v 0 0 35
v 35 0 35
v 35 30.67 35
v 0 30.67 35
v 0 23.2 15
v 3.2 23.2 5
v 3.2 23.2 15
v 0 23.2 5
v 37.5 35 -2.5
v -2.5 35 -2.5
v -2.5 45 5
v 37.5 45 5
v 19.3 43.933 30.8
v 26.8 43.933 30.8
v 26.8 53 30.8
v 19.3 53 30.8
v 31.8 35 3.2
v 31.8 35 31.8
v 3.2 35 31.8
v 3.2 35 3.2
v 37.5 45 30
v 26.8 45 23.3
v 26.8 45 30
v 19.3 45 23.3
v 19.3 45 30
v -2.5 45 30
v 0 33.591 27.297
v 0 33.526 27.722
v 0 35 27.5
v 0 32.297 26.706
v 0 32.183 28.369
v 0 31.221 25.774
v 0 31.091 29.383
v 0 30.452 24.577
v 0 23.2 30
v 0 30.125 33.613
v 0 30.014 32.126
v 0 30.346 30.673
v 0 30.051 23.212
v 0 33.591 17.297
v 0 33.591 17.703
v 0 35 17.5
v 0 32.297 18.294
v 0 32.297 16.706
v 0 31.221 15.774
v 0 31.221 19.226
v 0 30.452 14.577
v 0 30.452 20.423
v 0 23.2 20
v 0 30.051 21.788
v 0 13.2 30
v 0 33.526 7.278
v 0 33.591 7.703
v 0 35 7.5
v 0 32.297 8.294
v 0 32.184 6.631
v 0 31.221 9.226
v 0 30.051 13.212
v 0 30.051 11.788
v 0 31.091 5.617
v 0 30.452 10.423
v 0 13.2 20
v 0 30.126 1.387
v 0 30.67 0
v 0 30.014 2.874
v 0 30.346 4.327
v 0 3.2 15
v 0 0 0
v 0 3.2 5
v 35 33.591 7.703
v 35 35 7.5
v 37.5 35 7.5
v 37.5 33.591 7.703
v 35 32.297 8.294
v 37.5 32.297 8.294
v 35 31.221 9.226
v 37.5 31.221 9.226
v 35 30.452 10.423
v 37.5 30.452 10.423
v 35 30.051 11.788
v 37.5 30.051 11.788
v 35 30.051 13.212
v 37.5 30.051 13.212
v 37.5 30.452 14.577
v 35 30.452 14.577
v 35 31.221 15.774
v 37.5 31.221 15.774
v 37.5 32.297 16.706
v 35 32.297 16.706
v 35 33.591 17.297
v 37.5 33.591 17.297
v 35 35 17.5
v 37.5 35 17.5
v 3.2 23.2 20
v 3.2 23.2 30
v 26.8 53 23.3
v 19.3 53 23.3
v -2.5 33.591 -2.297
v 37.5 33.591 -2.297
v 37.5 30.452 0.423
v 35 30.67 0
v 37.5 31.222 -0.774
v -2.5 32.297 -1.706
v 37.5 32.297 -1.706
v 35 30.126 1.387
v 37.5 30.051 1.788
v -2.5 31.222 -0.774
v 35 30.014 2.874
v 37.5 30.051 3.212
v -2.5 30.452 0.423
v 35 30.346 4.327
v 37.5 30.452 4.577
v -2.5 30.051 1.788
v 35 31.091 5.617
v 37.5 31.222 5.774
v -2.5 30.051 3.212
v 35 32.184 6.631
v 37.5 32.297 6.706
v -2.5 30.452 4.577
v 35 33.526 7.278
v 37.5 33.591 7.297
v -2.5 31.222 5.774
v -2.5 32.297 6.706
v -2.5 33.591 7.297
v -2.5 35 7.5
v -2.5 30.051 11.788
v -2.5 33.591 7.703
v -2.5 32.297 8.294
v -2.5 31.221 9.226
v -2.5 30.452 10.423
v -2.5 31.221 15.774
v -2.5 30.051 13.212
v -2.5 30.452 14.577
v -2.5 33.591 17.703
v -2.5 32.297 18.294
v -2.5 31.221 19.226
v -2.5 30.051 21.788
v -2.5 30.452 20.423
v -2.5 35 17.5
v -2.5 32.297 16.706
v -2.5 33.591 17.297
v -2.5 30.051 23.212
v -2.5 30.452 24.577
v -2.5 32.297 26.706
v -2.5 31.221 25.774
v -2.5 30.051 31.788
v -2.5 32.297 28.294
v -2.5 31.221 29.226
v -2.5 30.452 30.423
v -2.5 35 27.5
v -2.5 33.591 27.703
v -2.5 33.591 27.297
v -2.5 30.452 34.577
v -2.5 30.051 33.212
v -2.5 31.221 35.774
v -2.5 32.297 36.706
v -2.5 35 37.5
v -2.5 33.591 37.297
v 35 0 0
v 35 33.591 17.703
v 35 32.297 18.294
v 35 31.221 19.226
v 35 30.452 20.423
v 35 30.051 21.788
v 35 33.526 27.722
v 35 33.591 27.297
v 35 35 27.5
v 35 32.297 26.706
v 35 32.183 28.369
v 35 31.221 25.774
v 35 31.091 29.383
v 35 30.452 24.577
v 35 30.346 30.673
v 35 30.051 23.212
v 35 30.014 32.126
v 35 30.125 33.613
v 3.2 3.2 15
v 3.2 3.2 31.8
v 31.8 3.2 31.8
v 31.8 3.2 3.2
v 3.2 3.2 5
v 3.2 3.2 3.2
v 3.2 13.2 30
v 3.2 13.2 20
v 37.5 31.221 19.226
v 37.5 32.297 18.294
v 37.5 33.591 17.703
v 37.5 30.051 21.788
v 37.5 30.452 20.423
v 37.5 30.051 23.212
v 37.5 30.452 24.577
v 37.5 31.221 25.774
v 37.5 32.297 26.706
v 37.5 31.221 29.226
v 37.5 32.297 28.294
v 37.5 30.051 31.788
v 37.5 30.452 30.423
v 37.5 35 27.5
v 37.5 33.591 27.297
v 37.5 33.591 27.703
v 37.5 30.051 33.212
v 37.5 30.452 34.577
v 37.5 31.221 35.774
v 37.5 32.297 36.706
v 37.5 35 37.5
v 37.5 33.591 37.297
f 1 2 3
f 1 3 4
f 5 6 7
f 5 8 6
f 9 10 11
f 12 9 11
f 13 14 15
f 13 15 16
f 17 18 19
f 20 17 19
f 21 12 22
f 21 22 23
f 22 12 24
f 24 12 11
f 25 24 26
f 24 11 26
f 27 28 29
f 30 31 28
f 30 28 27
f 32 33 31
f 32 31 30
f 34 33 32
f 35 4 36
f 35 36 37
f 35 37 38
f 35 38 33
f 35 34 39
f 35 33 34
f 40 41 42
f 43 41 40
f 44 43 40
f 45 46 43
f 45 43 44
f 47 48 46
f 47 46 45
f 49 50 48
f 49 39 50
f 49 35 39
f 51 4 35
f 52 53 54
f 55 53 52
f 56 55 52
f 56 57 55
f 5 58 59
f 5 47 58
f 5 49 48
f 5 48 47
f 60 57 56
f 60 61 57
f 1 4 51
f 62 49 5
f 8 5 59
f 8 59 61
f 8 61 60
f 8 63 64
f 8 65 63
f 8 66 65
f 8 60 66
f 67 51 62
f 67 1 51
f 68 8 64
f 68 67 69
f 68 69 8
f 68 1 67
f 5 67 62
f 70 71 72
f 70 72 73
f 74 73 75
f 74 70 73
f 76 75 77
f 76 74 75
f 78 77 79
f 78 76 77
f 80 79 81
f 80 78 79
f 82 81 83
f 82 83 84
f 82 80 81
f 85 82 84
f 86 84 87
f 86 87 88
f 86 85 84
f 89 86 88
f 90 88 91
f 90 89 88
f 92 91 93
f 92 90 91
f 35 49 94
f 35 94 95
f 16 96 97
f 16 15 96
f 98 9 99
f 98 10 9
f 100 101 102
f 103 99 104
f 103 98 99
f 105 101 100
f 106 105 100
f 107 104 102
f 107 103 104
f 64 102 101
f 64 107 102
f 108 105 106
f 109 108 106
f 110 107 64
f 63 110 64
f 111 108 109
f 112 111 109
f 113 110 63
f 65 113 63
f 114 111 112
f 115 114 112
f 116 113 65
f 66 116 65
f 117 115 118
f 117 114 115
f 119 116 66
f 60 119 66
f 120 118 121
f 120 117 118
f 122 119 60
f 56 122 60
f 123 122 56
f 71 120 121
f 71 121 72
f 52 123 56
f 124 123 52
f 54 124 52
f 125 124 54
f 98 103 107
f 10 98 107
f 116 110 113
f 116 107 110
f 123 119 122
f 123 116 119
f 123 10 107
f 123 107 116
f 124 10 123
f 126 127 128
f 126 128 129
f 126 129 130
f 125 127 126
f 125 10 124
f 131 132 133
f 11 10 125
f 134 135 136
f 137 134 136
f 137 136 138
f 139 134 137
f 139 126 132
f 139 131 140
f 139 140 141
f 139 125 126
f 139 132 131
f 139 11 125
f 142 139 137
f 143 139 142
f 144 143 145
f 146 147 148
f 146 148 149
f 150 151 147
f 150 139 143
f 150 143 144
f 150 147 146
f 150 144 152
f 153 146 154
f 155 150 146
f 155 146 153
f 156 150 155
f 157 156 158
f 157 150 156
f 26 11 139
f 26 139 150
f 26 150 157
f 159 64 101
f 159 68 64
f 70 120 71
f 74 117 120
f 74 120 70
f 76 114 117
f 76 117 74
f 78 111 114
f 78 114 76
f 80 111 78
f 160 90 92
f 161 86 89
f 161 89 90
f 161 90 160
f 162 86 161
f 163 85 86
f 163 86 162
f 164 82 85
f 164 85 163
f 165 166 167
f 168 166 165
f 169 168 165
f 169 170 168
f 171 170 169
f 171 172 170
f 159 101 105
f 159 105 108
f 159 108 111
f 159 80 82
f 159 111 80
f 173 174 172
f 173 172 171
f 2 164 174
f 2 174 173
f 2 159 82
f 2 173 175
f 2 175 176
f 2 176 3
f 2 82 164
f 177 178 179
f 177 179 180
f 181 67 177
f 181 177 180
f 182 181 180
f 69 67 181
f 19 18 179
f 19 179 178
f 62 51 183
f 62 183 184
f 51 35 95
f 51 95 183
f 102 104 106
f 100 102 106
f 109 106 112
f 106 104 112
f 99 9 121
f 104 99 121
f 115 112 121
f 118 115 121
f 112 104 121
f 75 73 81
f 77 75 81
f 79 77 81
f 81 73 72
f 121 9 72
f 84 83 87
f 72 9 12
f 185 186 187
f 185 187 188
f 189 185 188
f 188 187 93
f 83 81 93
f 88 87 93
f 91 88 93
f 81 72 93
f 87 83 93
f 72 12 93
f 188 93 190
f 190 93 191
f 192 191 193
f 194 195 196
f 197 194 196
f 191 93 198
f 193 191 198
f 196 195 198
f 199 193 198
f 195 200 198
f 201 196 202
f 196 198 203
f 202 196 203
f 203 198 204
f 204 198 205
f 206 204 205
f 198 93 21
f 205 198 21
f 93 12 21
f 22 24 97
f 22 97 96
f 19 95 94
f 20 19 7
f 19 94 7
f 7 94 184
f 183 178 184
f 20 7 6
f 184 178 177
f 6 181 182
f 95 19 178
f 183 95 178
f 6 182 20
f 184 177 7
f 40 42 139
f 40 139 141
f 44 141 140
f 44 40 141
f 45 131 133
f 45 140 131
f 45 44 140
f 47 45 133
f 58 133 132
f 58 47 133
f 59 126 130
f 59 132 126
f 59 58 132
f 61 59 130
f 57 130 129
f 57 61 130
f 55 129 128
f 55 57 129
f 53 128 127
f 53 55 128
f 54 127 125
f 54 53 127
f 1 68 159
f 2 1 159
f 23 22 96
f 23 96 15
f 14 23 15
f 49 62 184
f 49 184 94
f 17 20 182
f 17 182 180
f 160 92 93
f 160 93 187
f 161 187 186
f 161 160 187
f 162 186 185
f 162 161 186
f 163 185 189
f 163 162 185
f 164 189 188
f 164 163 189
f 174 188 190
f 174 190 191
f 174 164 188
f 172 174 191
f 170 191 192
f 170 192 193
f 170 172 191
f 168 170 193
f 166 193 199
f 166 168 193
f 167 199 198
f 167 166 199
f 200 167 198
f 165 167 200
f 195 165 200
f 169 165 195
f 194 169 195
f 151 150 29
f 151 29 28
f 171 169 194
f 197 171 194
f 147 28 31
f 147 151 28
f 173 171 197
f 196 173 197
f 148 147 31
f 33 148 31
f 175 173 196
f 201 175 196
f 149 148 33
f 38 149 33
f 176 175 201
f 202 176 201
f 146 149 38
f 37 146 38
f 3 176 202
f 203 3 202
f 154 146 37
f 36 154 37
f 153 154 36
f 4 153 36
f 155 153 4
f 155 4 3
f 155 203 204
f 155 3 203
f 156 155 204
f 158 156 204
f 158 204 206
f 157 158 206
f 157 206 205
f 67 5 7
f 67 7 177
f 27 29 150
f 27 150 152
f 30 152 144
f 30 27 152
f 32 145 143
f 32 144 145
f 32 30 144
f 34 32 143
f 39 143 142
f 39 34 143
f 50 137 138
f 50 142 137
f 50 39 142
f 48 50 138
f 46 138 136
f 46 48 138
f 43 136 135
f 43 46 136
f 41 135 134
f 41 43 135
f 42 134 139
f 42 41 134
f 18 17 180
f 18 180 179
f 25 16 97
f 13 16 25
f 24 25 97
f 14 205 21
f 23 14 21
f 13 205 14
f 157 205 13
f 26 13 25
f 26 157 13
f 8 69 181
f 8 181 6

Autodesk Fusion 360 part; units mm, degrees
sketch "Sketch1" plane through (0, 0, 0) normal (0, 1, 0) x (1, 0, 0)
  line L0 (0, 0) -> (35, 0)
  line L1 (35, 0) -> (35, -35)
  line L2 (35, -35) -> (0, -35)
  line L3 (0, -35) -> (0, 0)
  line L4 (3.2, -3.2) -> (31.8, -3.2)
  line L5 (31.8, -3.2) -> (31.8, -31.8)
  line L6 (31.8, -31.8) -> (3.2, -31.8)
  line L7 (3.2, -31.8) -> (3.2, -3.2)
  dimension "d1" = 35
  dimension "d2" = 3.2
  dimension "d3" = 3.2
  dimension "d4" = 35
  dimension "d5" = 3.2
  dimension "d6" = 3.2
extrude "Extrude1" add sketch "Sketch1" along normal blind 35 makes body 1
sketch "Sketch2" plane through (0, 35, 0) normal (0, 1, 0) x (-1, 0, 0)
  line L0 (-31.8, 31.8) -> (-3.2, 31.8)
  line L1 (-3.2, 31.8) -> (-3.2, 3.2)
  line L2 (-3.2, 3.2) -> (-31.8, 3.2)
  line L3 (-31.8, 3.2) -> (-31.8, 31.8)
  line L4 (0, 35) -> (-35, 35)
  line L5 (-35, 35) -> (-35, 0)
  line L6 (-35, 0) -> (0, 0)
  line L7 (0, 0) -> (0, 35)
  line L8 (2.5, -2.5) -> (-37.5, -2.5)
  line L9 (-37.5, -2.5) -> (-37.5, 37.5)
  line L10 (-37.5, 37.5) -> (2.5, 37.5)
  line L11 (2.5, 37.5) -> (2.5, -2.5)
  line L12 (-26.8, 30.8) -> (-19.3, 30.8)
  line L13 (-19.3, 30.8) -> (-19.3, 23.3)
  line L14 (-19.3, 23.3) -> (-26.8, 23.3)
  line L15 (-26.8, 23.3) -> (-26.8, 30.8)
  line L16 (-31.8, 31.8) -> (-3.2, 31.8)
  line L17 (-31.8, 3.2) -> (-31.8, 31.8)
  dimension "d9" = 2.5
  dimension "d10" = 2.5
  dimension "d11" = 2.5
  dimension "d12" = 2.5
  dimension "d54" = 7.5
  dimension "d55" = 7.5
  dimension "d56" = 1
  dimension "d57" = 5
sketch "Sketch3" plane through (0, 35, 0) normal (0, 1, 0) x (-1, 0, 0)
sketch "Sketch4" plane through (0, 0, 0) normal (-1, 0, 0) x (0, 0, 1)
  line L0 (0, 0) -> (35, 0)
  line L1 (35, 0) -> (35, 35)
  line L2 (35, 35) -> (0, 35)
  line L3 (0, 35) -> (0, 0)
  line L4 (-2.5, 35) -> (7.5, 35)
  arc A0 (-2.5, 35) -> (7.5, 35) centre (2.5, 35.0004) ccw
  arc A1 (7.5, 35) -> (17.5, 35) centre (12.5, 35) ccw
  arc A2 (17.5, 35) -> (27.5, 35) centre (22.5, 35) ccw
  line L5 (27.5, 35) -> (27.5, 35)
  line L6 (-2.5, 35) -> (5, 45)
  line L7 (5, 45) -> (30, 45)
  line L8 (5, 23.2) -> (15, 23.2)
  line L9 (15, 23.2) -> (15, 3.2)
  line L10 (15, 3.2) -> (5, 3.2)
  line L11 (5, 3.2) -> (5, 23.2)
  line L12 (20, 23.2) -> (30, 23.2)
  line L13 (30, 23.2) -> (30, 13.2)
  line L14 (30, 13.2) -> (20, 13.2)
  line L15 (20, 13.2) -> (20, 23.2)
  line L16 (7.5, 35) -> (17.5, 35)
  line L17 (27.5, 35) -> (17.5, 35)
  line L18 (35, 35) -> (37.5, 35)
  arc A3 (27.5, 35) -> (37.5, 35) centre (32.5, 35) ccw
  line L19 (37.5, 35) -> (30, 45)
  line L20 (37.5, 35) -> (-2.5, 35)
  point P0 (35, 35)
  point P1 (37.5, 35)
  dimension "d13" = 10
  dimension "d14" = 5
  dimension "d15" = 10
  dimension "d16" = 10
  dimension "d18" = 7.5
  dimension "d22" = 10
  dimension "d23" = 20
  dimension "d24" = 3.2
  dimension "d25" = 5
  dimension "d26" = 5
  dimension "d27" = 10
  dimension "d28" = 10
  dimension "d29" = 13.2
  dimension "d31" = 10
  dimension "d33" = 7.5
  dimension "d35" = 40
  dimension "d36" = 10
extrude "Extrude2" add sketch "Sketch1" along normal blind 3.2 contours L4 L5 L6 L7 bodies 1
extrude "Extrude3" cut sketch "Sketch4" against normal blind 3.2 contours L8 L9 L10 L11 bodies 1
extrude "Extrude4" cut sketch "Sketch4" against normal blind 3.2 contours L12 L13 L14 L15 bodies 1
extrude "Extrude5" add sketch "Sketch4" along normal blind 2.5 separate body contours L3 L4 A0 L20 | L2 L3 L4 A0 L20 | L1 L2 A3 L20 | L1 L18 A3 L20 | L2 L4 L6 L7 L16 L17 L18 L19 L20 | L2 A1 L16 L20 | L2 A2 L17 L20 makes body 2
extrude "Extrude6" add sketch "Sketch4" against normal blind 37.5 contours L3 L4 A0 L20 bodies 1 2
extrude "Extrude7" add sketch "Sketch4" against normal blind 37.5 separate body contours L1 L18 A3 L20 makes body 3
extrude "Extrude8" add sketch "Sketch4" against normal blind 37.5 contours L2 L4 L6 L7 L16 L17 L18 L19 L20 bodies 1 3
extrude "Extrude9" add sketch "Sketch4" against normal blind 2.5 from surface at -35 contours L2 L3 L4 A0 L20 | L1 L2 A3 L20 | L2 A1 L16 L20 | L2 A2 L17 L20 bodies 1
extrude "Extrude10" add sketch "Sketch2" along normal blind 18 contours L12 L13 L14 L15 bodies 1
